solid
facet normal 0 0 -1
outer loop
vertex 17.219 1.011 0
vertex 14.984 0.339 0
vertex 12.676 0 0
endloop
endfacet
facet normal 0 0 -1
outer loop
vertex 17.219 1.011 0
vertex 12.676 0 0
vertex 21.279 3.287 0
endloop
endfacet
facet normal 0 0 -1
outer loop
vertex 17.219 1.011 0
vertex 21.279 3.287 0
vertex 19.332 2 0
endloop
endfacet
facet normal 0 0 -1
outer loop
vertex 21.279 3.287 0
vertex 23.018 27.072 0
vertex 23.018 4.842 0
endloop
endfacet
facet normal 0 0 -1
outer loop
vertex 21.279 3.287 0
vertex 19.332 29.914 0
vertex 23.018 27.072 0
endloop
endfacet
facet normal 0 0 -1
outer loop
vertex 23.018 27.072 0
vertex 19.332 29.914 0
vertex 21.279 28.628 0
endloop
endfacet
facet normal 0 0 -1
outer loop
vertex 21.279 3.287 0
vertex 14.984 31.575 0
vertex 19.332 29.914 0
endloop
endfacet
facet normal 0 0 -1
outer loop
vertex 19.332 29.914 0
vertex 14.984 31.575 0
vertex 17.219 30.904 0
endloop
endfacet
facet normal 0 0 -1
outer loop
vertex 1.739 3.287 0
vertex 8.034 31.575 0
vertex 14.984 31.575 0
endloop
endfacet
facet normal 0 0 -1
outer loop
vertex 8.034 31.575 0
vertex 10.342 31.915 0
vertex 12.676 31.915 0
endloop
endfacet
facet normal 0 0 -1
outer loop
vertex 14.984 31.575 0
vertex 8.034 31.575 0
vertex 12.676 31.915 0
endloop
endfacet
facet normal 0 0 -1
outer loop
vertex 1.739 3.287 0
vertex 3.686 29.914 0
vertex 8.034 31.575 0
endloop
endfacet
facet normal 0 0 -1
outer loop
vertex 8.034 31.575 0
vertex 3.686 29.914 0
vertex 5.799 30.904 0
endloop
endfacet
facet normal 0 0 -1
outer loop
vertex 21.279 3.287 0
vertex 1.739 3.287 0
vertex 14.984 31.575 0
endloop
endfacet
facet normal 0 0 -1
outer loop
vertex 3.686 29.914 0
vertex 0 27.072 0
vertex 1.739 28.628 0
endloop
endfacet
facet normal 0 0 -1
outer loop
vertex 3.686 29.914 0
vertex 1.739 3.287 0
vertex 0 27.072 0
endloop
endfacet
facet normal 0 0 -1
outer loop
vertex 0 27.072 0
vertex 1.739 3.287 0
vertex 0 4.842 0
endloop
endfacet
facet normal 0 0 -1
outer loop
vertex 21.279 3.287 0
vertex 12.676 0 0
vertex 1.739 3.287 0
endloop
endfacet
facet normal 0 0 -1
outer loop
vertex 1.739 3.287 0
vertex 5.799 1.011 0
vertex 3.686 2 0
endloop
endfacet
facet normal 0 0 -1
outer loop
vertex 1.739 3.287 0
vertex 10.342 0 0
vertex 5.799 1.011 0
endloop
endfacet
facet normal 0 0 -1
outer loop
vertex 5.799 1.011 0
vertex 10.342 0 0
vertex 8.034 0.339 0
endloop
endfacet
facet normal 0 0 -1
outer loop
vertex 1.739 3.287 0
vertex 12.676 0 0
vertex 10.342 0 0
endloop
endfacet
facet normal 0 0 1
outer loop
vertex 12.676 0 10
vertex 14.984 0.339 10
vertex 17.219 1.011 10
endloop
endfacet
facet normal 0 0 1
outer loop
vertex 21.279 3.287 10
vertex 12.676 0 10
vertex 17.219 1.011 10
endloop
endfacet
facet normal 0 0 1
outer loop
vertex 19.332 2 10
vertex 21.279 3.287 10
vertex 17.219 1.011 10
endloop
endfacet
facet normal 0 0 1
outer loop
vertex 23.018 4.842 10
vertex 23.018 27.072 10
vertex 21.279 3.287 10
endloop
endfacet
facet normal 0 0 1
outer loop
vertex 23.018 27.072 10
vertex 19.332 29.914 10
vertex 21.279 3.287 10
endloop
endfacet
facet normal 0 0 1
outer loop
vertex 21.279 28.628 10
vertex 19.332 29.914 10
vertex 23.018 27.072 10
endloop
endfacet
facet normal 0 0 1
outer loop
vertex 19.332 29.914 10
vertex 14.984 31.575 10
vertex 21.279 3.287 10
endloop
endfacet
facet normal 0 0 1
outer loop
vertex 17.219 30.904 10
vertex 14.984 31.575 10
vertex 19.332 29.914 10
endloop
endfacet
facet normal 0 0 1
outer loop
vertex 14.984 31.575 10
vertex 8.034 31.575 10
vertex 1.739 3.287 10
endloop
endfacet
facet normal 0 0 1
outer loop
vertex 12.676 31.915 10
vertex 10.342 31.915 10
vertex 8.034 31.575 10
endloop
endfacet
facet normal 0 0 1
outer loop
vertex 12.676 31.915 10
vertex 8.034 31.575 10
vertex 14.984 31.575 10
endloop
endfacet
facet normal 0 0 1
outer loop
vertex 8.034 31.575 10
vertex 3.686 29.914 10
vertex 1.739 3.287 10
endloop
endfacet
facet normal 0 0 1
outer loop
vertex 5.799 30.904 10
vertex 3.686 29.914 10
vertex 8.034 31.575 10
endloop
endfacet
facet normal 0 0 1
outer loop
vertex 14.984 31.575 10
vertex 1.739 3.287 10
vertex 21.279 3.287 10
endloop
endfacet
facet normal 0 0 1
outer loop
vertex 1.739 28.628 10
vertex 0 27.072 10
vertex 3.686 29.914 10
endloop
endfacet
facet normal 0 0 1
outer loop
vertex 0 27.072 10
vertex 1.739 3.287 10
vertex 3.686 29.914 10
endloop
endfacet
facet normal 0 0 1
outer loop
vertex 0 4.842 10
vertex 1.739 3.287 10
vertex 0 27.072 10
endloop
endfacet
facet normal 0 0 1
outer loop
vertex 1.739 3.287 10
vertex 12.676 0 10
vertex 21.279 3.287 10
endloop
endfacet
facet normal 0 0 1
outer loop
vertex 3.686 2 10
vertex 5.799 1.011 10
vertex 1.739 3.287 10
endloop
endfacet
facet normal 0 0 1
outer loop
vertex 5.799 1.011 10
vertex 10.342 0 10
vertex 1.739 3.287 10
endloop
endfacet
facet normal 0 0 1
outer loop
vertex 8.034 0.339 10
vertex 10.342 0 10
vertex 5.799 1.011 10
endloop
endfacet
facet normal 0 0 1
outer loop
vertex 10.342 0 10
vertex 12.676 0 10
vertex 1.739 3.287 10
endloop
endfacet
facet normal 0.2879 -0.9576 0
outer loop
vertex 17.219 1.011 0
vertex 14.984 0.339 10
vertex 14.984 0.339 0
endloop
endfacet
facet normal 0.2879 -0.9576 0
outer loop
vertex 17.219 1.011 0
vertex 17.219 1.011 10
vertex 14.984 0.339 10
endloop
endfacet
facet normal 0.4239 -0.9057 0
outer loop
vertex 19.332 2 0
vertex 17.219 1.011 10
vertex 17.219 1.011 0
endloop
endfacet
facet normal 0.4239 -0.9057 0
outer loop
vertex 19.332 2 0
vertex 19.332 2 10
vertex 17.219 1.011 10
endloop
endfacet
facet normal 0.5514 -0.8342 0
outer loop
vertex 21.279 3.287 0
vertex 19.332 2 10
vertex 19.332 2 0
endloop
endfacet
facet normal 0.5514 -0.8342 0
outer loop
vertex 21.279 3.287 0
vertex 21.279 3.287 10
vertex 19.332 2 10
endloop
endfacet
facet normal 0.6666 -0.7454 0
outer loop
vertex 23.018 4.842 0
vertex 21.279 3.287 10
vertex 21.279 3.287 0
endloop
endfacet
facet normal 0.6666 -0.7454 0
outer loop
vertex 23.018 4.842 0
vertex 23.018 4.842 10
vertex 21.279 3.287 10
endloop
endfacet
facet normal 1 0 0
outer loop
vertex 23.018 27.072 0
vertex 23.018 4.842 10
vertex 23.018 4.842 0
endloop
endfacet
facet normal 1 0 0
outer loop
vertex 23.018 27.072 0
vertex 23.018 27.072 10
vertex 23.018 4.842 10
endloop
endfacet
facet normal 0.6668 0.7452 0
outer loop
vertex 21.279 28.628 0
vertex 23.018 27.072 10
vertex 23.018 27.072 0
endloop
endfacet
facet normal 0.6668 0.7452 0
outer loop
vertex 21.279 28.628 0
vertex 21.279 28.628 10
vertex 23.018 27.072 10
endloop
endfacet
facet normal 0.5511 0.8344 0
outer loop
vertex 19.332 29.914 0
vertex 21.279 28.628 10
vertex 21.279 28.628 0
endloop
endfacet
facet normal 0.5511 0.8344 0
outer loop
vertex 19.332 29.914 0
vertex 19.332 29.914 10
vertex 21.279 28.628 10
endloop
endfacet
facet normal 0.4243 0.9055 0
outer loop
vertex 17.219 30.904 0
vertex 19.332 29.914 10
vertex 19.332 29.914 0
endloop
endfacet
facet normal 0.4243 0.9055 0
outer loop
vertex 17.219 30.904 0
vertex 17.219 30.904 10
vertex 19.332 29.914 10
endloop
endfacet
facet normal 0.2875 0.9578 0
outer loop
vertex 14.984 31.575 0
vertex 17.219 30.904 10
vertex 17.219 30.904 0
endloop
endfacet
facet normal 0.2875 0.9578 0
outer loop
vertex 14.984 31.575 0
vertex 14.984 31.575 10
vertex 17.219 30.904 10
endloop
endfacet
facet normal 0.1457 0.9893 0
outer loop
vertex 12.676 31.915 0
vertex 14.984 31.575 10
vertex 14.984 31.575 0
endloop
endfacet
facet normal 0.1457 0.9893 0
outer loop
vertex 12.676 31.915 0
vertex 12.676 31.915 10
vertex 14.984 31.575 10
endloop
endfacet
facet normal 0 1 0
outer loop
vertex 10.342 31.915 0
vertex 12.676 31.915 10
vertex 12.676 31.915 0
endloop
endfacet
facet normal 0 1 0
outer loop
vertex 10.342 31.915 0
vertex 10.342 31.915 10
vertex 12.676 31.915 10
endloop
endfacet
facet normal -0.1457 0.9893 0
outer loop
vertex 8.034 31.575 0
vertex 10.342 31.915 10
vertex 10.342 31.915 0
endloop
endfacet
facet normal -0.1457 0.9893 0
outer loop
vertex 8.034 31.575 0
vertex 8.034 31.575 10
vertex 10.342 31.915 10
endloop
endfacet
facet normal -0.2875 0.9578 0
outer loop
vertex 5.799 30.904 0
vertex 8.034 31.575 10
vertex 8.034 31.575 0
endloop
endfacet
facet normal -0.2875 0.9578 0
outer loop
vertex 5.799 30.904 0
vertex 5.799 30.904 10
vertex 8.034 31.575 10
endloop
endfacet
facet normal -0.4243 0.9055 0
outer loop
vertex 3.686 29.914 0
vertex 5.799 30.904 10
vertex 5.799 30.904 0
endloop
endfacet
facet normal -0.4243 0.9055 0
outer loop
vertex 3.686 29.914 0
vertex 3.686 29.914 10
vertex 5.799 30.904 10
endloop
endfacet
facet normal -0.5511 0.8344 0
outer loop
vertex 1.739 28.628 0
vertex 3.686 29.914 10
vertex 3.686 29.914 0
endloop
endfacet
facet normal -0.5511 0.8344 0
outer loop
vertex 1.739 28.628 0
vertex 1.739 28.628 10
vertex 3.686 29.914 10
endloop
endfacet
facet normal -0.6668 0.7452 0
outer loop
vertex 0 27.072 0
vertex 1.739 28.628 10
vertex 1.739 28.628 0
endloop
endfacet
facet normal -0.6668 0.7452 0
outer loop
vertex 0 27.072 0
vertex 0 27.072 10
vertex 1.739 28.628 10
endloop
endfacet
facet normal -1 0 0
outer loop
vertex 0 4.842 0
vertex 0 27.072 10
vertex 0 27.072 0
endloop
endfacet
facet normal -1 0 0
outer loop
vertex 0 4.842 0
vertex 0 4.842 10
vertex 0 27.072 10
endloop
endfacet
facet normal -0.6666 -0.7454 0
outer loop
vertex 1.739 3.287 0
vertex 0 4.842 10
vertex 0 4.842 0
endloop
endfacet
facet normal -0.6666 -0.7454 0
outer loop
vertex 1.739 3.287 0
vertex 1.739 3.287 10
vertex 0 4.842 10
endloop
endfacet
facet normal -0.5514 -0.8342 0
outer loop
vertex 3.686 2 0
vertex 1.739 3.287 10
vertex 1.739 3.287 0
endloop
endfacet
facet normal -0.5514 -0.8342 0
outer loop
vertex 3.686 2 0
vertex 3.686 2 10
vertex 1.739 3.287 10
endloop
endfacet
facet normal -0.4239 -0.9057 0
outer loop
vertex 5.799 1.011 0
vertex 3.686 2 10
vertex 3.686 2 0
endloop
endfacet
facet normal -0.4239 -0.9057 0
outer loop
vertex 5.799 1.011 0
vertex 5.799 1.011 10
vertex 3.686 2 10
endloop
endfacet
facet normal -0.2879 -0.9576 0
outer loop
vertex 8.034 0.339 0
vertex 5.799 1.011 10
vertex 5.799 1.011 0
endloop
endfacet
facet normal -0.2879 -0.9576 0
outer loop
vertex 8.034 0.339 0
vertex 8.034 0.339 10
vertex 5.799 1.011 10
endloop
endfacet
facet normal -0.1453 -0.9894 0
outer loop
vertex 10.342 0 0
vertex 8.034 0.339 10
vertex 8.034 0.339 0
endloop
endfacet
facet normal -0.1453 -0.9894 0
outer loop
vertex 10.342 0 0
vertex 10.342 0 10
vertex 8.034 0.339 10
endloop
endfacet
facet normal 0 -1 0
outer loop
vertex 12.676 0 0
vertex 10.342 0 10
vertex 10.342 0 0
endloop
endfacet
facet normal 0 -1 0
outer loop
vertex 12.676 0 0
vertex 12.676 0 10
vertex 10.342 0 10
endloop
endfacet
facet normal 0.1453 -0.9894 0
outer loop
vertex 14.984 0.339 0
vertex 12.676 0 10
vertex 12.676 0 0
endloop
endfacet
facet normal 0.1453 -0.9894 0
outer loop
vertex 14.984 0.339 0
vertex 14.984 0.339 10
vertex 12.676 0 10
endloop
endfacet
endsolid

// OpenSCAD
$fn = 32;

// ----------------------------------------------------------------------
// Flat adaptor: double_d, 10 mm thick
// ----------------------------------------------------------------------

// --- parameters (mm) ---
profile_height = 10;      // extrusion height
profile_points = 24;      // points of the closed outline

profile = [[23.018, 27.072], [21.279, 28.628], [19.332, 29.914], [17.219, 30.904], [14.984, 31.575], [12.676, 31.915], [10.342, 31.915], [8.034, 31.575], [5.799, 30.904], [3.686, 29.914], [1.739, 28.628], [0, 27.072], [0, 4.842], [1.739, 3.287], [3.686, 2], [5.799, 1.011], [8.034, 0.339], [10.342, 0], [12.676, 0], [14.984, 0.339], [17.219, 1.011], [19.332, 2], [21.279, 3.287], [23.018, 4.842]];  // single closed polygon, 24 points, counter clockwise

// --- the one profile operation ---
linear_extrude(height = profile_height) polygon(points = profile);
